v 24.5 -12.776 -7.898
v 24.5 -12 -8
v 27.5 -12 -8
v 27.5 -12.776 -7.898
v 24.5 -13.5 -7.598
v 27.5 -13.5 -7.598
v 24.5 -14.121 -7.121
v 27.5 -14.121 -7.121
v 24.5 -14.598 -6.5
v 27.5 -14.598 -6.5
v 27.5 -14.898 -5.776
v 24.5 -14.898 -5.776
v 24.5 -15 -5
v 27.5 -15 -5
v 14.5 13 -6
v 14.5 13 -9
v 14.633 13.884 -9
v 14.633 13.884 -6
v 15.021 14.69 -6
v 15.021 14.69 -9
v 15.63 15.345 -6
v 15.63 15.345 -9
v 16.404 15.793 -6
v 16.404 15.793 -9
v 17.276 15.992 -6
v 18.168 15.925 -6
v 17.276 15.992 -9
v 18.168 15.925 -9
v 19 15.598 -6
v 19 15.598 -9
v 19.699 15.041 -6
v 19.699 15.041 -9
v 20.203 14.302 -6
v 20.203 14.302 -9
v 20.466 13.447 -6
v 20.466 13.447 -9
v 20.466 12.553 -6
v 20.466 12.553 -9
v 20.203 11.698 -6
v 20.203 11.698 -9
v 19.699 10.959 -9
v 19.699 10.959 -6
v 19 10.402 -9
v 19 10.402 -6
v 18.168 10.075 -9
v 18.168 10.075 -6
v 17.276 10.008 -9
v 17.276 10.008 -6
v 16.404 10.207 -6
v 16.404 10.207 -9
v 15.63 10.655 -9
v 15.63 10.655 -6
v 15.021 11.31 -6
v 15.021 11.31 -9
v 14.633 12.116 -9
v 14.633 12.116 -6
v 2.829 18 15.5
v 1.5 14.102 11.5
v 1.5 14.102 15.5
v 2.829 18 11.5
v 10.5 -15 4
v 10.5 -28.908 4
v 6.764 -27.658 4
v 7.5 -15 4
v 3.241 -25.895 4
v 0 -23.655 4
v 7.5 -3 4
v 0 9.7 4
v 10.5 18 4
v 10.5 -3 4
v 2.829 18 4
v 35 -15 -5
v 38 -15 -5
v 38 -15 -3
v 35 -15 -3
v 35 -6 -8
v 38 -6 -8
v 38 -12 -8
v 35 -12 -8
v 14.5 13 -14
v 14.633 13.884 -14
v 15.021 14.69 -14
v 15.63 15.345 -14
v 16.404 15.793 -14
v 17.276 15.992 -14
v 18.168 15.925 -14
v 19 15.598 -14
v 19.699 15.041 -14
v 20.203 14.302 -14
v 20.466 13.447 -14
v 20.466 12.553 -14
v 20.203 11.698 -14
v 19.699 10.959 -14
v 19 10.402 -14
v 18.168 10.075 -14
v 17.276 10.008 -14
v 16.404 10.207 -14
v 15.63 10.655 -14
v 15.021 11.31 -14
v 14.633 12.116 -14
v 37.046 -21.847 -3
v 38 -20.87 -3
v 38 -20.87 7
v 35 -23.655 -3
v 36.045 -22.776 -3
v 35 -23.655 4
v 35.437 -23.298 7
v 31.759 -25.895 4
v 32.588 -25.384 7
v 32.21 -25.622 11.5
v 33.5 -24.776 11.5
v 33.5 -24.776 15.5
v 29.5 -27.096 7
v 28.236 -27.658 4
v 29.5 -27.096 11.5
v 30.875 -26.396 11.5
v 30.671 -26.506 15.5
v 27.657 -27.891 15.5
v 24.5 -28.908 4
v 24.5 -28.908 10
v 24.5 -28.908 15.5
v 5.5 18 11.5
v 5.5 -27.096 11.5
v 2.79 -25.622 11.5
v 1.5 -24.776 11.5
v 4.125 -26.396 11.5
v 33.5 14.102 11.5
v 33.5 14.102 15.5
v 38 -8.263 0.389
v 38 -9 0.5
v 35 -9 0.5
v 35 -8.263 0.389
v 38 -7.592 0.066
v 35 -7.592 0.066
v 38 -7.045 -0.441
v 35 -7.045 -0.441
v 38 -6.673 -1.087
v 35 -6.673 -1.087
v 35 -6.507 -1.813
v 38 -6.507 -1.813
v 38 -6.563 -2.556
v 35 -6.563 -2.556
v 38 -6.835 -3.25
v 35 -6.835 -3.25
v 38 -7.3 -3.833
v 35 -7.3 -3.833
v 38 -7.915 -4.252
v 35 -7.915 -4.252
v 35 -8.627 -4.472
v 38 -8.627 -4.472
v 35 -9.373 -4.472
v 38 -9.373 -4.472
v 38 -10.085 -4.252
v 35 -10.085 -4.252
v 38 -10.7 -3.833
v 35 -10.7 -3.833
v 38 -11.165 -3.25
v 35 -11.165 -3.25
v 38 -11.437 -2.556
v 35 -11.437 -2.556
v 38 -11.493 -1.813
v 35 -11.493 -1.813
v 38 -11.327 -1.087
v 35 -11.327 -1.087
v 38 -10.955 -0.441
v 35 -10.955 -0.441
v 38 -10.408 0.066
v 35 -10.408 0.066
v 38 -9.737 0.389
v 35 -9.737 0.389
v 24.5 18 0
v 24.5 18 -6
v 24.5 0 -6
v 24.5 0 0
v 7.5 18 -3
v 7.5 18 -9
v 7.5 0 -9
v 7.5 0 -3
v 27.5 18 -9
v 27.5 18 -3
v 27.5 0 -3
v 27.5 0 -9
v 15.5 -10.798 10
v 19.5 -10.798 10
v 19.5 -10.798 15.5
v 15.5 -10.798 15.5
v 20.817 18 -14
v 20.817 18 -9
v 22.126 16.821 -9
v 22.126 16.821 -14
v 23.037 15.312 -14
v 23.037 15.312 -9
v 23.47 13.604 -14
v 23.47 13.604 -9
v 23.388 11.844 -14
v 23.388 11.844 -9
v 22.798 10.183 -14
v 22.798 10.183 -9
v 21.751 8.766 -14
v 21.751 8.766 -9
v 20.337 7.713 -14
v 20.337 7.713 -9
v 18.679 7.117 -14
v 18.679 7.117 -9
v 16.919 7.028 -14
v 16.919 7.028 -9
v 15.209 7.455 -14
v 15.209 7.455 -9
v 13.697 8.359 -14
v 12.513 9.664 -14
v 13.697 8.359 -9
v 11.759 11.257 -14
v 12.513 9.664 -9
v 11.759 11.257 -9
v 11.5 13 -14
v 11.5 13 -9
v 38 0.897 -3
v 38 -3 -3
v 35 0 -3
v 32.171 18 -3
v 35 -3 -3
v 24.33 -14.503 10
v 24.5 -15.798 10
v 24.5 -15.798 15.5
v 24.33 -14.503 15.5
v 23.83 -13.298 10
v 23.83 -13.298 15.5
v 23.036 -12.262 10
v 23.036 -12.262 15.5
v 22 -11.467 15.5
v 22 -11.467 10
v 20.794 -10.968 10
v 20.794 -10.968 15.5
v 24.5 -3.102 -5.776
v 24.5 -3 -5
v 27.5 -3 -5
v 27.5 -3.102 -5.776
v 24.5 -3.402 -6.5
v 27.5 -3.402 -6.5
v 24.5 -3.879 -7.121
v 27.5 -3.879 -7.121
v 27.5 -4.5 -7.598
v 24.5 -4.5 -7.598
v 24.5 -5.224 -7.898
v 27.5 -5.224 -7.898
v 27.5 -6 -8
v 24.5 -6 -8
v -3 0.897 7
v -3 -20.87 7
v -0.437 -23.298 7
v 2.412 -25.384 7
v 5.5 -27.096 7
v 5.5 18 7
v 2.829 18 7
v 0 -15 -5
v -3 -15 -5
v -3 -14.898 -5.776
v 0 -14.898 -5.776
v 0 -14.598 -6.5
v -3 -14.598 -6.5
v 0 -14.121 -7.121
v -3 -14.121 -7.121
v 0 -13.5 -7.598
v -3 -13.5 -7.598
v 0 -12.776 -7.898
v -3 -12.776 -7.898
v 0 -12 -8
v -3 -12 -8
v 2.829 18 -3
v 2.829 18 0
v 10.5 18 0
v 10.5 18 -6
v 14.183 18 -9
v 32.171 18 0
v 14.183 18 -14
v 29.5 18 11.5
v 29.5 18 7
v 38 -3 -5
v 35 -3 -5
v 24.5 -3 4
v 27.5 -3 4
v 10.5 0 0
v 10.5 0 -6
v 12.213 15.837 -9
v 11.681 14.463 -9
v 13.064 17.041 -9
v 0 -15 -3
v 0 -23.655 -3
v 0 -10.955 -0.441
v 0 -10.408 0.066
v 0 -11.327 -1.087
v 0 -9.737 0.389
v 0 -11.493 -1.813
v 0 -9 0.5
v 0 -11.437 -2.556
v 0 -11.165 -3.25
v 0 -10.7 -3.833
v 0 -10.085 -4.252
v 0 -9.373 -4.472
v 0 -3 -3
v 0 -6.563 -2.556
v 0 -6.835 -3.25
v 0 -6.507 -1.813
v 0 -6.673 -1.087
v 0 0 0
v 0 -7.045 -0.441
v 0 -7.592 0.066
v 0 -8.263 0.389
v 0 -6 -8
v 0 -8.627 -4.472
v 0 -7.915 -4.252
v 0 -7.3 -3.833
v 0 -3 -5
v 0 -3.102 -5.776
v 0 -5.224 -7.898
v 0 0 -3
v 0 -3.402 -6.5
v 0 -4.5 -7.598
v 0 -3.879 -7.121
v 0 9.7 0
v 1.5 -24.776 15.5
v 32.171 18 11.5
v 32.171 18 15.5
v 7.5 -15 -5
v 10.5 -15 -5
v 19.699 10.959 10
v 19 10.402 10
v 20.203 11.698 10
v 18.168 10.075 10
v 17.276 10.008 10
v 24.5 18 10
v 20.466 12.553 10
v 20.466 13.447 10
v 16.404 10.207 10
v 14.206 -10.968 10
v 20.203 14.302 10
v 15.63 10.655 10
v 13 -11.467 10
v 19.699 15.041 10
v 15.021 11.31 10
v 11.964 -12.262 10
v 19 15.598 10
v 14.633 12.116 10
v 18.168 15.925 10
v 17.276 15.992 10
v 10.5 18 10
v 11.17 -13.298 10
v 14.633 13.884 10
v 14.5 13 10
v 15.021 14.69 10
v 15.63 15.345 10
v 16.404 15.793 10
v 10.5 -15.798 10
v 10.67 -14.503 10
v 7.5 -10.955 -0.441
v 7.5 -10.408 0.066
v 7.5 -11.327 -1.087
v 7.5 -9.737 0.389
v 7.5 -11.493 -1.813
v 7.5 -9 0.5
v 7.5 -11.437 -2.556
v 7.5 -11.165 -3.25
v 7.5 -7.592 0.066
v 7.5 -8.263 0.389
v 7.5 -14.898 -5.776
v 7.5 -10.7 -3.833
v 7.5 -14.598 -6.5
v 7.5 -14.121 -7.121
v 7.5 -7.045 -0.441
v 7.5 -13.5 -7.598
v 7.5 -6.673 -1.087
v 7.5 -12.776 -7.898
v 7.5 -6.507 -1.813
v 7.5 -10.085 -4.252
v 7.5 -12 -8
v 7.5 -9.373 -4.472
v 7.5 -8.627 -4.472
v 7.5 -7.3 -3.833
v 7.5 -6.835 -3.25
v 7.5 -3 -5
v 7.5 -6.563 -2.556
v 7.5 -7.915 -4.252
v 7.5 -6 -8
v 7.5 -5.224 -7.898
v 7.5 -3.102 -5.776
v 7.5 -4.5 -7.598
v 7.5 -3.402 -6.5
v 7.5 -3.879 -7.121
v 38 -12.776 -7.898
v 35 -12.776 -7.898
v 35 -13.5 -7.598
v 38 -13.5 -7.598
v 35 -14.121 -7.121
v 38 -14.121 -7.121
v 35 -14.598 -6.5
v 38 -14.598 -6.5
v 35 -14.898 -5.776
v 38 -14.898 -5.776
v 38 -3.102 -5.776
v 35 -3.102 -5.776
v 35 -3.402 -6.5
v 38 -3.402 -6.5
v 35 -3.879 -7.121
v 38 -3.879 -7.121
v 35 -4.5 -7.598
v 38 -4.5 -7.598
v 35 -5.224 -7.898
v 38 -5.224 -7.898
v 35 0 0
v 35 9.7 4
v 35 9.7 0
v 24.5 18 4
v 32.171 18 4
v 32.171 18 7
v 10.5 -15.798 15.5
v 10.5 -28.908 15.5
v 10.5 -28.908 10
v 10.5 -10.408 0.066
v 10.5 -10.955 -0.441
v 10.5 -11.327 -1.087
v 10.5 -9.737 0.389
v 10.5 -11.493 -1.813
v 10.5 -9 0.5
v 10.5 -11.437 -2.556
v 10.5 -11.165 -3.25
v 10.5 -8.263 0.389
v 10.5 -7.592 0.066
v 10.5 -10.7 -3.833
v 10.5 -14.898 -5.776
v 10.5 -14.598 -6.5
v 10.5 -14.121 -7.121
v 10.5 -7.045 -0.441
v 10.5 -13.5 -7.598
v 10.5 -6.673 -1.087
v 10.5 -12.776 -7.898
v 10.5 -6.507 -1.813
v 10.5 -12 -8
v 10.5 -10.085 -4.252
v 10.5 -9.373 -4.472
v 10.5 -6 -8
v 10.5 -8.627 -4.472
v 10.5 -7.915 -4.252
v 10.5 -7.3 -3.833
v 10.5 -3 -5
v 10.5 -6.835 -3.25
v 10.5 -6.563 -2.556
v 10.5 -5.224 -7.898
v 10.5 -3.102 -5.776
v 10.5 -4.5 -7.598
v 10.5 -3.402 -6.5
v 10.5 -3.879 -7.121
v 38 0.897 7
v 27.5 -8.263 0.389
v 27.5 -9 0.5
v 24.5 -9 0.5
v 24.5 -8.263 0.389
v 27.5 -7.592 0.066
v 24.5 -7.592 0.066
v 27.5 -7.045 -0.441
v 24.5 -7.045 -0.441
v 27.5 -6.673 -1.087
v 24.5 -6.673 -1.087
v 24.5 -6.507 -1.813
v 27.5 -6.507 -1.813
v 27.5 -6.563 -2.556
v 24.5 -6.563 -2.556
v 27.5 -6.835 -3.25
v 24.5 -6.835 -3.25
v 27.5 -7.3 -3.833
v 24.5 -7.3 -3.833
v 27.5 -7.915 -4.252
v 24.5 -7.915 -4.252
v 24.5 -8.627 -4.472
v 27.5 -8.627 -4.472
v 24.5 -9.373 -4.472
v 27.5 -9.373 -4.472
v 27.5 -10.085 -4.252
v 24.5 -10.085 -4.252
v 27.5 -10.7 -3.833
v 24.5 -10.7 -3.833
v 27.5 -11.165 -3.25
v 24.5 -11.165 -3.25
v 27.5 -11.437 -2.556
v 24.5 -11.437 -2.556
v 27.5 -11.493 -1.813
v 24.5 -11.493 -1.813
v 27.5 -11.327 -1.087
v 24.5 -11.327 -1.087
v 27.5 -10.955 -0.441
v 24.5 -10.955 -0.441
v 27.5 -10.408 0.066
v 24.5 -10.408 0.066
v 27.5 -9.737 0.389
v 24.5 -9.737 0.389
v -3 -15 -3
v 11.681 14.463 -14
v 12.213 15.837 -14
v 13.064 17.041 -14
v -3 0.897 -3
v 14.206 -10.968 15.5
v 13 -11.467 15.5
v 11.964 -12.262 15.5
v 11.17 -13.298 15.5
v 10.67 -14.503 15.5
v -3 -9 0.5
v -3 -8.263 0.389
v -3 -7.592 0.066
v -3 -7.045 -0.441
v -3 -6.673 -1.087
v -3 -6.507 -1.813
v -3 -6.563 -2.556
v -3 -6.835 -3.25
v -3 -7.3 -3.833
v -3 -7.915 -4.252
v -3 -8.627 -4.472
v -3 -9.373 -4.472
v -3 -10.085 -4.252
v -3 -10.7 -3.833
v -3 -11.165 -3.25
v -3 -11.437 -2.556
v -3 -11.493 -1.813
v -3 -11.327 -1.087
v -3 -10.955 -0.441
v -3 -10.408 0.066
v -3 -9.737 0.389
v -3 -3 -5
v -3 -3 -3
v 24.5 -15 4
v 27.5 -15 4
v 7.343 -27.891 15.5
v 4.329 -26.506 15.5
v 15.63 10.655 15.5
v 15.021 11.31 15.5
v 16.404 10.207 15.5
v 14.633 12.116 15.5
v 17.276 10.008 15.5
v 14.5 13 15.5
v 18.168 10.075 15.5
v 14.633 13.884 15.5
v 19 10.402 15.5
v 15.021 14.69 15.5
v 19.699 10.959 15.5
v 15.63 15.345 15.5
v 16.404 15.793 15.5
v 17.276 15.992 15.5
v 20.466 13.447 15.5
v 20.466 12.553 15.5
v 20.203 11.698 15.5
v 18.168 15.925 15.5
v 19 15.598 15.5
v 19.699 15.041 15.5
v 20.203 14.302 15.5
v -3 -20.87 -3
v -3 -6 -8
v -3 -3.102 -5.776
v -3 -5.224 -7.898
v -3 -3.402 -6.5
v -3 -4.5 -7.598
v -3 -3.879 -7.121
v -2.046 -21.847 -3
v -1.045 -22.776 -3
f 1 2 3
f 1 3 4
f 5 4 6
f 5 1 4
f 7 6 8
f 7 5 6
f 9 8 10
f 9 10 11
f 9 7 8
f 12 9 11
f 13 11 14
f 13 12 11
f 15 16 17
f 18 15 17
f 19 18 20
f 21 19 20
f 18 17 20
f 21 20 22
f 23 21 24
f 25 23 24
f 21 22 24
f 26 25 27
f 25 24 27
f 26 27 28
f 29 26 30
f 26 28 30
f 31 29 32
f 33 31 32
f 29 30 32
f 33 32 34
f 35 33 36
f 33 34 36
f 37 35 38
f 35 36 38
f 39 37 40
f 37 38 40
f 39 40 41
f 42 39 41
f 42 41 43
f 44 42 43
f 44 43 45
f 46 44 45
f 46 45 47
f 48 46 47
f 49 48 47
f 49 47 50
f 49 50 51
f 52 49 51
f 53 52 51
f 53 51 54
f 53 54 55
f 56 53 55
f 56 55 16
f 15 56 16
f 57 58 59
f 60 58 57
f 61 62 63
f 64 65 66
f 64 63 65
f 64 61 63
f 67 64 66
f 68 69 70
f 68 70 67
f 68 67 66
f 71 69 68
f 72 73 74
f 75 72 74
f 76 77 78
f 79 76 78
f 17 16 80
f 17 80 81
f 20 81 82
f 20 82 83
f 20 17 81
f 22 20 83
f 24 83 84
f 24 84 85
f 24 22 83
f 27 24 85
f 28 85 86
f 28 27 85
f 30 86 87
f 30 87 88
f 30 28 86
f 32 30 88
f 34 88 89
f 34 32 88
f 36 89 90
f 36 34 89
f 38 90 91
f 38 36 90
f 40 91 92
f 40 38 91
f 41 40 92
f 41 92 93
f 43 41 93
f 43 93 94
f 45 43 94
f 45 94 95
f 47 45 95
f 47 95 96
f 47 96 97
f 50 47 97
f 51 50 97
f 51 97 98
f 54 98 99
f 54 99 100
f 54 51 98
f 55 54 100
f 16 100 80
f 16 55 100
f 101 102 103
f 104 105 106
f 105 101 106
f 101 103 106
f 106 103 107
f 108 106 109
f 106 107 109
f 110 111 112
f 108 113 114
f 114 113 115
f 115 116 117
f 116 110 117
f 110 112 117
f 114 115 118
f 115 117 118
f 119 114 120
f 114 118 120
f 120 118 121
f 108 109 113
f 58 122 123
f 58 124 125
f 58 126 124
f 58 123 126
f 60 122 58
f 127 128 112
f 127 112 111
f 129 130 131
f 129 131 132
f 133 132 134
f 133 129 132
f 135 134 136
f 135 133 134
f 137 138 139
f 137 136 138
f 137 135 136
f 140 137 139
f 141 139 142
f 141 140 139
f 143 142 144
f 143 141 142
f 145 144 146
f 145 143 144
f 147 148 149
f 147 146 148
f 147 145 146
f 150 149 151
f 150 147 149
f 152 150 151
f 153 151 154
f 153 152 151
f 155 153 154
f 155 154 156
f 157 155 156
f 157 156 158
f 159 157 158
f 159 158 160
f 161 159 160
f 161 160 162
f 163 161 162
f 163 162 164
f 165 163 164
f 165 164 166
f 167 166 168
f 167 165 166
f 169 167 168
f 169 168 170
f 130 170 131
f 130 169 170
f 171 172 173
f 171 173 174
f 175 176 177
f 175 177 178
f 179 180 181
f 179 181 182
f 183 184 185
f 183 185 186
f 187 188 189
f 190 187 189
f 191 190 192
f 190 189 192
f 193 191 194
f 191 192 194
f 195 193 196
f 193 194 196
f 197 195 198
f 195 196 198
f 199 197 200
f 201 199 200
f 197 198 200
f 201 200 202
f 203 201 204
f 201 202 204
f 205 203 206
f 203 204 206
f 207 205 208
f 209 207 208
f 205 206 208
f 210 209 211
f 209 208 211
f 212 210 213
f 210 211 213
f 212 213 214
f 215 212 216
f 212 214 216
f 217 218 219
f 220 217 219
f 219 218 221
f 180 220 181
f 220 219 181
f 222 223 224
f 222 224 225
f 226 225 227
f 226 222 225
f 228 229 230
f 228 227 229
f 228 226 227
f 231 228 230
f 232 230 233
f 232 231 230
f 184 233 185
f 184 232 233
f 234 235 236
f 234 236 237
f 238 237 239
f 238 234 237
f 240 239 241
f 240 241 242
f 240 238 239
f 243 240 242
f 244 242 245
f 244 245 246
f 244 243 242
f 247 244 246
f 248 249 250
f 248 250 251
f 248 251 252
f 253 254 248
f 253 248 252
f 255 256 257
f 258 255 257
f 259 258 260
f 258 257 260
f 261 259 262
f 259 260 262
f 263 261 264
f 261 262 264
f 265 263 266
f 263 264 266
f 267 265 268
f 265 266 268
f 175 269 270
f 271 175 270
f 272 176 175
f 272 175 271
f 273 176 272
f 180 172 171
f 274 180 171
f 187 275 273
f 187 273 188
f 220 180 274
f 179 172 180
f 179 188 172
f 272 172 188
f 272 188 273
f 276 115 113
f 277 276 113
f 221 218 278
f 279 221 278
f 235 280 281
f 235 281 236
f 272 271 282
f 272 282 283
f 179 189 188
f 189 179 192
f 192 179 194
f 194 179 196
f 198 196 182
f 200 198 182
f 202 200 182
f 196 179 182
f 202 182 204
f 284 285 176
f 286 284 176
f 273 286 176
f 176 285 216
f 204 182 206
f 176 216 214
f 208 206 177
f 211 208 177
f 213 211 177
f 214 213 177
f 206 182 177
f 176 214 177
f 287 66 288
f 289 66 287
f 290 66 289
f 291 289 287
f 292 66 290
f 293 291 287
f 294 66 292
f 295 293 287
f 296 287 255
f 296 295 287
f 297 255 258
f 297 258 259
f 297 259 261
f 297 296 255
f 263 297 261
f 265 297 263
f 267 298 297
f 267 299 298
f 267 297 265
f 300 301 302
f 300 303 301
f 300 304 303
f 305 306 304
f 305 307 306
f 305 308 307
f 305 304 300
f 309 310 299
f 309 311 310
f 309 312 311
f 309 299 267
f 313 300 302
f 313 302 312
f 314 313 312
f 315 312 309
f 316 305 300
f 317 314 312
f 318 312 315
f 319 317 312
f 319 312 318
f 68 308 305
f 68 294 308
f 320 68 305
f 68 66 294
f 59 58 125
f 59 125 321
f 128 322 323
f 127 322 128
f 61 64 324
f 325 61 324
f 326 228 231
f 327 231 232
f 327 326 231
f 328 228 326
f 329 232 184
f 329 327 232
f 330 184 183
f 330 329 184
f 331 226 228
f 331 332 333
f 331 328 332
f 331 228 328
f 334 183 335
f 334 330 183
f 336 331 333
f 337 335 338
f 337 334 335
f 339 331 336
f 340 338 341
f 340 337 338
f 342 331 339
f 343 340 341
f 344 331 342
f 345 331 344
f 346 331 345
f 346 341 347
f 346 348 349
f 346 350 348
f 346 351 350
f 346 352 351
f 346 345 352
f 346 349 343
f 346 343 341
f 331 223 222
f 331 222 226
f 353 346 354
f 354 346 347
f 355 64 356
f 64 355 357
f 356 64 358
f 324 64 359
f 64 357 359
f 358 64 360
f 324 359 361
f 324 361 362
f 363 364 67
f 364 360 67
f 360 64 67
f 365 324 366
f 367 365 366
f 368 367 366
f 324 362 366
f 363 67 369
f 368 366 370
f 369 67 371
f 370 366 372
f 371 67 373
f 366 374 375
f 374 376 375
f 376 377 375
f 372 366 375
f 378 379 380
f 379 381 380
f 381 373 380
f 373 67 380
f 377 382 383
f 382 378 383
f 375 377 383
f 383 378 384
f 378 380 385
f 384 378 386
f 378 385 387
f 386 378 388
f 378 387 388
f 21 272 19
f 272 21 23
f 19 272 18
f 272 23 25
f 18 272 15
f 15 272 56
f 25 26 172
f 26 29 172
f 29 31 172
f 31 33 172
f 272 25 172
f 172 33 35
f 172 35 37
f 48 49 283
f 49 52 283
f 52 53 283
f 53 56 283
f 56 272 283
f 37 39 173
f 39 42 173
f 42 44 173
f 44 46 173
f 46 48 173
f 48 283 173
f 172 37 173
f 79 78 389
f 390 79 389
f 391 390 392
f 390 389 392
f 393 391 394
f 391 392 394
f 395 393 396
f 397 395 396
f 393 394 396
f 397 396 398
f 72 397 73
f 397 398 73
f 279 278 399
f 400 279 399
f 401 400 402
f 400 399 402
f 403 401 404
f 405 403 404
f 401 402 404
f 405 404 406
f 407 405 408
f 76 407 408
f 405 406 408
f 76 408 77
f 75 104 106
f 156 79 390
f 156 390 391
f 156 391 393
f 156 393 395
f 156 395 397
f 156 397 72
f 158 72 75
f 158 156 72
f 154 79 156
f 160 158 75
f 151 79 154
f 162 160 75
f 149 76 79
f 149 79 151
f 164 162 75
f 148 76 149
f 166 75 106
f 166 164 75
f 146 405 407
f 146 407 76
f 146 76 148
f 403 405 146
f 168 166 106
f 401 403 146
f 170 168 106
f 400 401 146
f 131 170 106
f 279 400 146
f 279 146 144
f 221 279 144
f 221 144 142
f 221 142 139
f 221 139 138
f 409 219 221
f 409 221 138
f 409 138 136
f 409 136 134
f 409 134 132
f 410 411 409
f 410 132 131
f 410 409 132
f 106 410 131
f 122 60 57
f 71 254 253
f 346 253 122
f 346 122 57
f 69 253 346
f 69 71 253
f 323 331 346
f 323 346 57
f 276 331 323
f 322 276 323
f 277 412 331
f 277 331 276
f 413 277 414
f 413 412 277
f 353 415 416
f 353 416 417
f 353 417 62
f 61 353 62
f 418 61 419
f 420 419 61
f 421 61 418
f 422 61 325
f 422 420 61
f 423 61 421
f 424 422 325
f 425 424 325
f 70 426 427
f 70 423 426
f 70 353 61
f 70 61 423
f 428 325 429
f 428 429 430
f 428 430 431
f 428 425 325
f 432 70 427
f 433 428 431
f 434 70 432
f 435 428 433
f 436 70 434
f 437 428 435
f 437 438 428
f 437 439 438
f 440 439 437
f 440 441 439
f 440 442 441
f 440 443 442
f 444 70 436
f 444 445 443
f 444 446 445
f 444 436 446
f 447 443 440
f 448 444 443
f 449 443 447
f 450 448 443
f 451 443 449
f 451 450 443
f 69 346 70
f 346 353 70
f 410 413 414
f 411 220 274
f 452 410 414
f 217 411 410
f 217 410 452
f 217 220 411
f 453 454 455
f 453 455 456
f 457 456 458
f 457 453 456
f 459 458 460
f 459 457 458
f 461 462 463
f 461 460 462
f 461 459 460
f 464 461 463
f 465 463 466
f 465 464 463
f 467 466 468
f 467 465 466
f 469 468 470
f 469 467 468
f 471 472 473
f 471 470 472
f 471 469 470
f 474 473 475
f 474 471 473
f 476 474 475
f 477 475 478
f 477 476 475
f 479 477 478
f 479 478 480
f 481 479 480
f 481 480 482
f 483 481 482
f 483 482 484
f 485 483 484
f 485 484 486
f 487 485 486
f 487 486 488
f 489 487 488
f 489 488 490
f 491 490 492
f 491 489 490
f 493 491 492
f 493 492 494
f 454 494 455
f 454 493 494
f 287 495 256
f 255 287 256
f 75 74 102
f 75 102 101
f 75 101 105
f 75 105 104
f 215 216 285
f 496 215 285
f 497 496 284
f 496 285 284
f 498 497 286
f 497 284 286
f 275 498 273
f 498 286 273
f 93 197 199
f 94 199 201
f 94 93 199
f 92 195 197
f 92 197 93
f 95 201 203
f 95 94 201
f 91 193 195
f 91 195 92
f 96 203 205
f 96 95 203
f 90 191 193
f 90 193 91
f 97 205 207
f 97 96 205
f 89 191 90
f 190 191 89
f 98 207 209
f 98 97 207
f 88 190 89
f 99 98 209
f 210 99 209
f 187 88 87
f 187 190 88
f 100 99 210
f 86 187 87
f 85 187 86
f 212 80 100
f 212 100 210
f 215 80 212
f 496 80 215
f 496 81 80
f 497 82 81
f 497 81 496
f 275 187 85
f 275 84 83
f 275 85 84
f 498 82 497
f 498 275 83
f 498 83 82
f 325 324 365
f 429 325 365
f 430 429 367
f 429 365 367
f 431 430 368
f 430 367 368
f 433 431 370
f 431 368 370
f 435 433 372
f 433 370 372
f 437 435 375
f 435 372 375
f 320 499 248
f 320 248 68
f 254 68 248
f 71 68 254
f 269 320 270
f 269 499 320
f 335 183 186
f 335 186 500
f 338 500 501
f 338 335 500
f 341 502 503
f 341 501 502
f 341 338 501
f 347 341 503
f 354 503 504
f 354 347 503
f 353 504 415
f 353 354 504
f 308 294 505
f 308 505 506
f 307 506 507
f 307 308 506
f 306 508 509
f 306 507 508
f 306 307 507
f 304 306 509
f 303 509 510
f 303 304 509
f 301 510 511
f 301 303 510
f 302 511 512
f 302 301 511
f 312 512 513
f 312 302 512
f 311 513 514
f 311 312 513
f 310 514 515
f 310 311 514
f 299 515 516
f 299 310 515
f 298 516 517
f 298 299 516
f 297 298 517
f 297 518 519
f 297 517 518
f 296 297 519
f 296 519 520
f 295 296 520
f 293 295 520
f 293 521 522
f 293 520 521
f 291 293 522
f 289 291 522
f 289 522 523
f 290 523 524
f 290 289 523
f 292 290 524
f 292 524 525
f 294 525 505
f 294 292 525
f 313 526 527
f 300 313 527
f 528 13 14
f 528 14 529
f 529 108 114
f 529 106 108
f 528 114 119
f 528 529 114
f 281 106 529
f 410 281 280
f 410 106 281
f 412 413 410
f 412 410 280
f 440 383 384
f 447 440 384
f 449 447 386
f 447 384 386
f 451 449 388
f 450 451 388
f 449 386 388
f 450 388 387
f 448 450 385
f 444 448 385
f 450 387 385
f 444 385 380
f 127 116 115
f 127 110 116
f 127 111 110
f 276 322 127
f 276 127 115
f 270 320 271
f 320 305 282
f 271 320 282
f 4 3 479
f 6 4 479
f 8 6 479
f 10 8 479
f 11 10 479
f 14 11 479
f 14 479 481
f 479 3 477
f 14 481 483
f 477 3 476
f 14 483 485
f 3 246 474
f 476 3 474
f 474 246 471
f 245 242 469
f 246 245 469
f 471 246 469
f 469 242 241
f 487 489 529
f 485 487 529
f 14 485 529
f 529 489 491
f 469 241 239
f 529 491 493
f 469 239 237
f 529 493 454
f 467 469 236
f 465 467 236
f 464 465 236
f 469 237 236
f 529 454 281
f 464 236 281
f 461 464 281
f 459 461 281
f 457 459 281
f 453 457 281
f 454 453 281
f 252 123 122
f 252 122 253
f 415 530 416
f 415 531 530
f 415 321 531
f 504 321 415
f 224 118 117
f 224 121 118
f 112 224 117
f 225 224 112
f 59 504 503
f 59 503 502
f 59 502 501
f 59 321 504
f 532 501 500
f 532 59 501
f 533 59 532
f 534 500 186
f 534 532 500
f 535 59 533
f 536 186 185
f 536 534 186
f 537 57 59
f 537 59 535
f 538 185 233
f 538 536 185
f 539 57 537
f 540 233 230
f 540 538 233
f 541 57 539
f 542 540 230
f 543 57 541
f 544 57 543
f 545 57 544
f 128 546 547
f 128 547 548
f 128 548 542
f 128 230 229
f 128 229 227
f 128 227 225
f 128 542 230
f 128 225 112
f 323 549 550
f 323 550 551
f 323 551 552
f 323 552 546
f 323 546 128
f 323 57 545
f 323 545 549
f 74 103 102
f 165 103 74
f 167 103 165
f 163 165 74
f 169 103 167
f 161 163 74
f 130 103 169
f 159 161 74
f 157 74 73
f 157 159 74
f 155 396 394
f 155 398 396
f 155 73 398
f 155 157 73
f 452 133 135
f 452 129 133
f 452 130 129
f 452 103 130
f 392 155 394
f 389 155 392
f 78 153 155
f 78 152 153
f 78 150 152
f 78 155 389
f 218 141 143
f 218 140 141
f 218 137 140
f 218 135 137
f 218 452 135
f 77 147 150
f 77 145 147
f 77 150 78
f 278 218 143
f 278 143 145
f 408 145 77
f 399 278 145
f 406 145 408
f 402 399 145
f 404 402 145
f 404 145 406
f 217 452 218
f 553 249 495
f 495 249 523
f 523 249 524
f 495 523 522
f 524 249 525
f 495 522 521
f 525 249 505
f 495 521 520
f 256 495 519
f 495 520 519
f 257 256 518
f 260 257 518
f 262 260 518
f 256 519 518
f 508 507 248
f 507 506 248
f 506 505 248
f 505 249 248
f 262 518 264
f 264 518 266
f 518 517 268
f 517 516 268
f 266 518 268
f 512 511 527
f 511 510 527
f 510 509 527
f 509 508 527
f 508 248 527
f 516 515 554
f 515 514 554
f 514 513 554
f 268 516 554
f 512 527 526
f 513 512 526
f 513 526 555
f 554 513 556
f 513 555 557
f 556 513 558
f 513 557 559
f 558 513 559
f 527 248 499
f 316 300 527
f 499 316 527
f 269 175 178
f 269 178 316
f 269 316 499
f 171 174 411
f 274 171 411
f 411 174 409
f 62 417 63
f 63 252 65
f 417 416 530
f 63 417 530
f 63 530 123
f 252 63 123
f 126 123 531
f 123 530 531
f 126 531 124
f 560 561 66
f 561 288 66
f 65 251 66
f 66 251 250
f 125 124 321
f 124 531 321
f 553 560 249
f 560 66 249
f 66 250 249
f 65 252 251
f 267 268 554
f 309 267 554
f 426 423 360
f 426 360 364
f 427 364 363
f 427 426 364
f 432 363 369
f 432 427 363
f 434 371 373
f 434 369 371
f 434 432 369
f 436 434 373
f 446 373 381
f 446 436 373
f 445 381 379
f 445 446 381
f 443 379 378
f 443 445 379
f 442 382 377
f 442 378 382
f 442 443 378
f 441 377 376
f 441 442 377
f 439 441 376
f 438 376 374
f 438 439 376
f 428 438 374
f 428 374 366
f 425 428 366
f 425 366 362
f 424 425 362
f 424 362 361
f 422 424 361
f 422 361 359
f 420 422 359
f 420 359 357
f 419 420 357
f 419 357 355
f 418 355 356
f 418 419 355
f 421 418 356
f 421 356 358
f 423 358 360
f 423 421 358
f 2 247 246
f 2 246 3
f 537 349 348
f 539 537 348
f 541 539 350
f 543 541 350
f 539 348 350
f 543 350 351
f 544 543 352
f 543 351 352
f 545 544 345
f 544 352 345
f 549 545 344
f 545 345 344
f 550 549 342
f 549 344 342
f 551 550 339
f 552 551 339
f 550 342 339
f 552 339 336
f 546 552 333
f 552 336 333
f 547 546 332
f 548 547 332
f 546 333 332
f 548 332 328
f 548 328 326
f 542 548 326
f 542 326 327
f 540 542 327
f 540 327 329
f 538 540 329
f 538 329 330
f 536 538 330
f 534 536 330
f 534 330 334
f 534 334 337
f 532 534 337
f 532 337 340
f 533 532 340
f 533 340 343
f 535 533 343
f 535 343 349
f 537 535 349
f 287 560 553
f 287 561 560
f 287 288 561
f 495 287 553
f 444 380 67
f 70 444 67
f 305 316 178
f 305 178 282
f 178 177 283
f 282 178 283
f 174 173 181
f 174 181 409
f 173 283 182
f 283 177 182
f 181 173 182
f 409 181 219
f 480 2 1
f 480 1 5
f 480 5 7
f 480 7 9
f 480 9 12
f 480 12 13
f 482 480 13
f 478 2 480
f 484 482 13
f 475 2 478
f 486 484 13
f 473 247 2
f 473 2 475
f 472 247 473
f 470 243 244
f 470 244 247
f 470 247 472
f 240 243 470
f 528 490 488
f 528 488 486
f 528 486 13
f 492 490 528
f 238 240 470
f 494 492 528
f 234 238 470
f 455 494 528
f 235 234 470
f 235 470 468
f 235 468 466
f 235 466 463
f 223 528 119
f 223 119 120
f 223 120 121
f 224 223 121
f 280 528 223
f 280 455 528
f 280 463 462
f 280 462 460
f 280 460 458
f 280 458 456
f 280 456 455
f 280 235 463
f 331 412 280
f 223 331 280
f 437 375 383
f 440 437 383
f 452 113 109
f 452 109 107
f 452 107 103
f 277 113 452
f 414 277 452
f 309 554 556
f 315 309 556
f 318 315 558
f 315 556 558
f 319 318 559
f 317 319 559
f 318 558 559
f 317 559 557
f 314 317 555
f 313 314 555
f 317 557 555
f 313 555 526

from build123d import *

# Parameters (mm, degrees)
BOSS_EXTRUDE1_DEPTH     = 18
SKETCH2_R               = 3
BOSS_EXTRUDE2_DEPTH     = 5
SKETCH2_3_R             = 3
CUT_EXTRUDE1_DEPTH      = 49.664668909
SKETCH1_3_W             = 2
SKETCH1_3_H             = 4.5
BOSS_EXTRUDE3_DEPTH     = 30
SKETCH3_OUTSIDE_W       = 56.936
SKETCH3_OUTSIDE_H       = 63.936
SKETCH3_OUTSIDE_R       = 28
CUT_EXTRUDE2_DEPTH      = 57.69435598
CUT_EXTRUDE3_START      = -18.5
CUT_EXTRUDE3_DEPTH      = 18.5
CUT_EXTRUDE4_DEPTH      = 57.587476675
CUT_EXTRUDE4_DEPTH_BACK = 10
SKETCH7_R               = 2.5
BOSS_EXTRUDE4_DEPTH     = 3
BOSS_EXTRUDE6_START     = -3
BOSS_EXTRUDE6_DEPTH     = 3
BOSS_EXTRUDE7_START     = -3
BOSS_EXTRUDE7_DEPTH     = 3
BOSS_EXTRUDE8_START     = -3
BOSS_EXTRUDE8_DEPTH     = 3
CUT_EXTRUDE5_DEPTH      = 43.804159814
CUT_EXTRUDE5_DEPTH_BACK = 43.804159814
SKETCH7_3_R             = 2.5


# Read off the part's stored shape, not the designer's step: Cut-Extrude3
with BuildPart() as part:
    # Sketch1 → Boss-Extrude1 (new body)
    with BuildSketch(Plane(origin=(0, 0, 0), x_dir=(1, 0, 0), z_dir=(0, 1, 0))):
        Polygon((7.5, 3), (-3, 3), (-3, -7), (5.5, -7), (5.5, -11.5), (1.5, -11.5), (1.5, -15.5), (33.5, -15.5), (33.5, -11.5), (29.5, -11.5), (29.5, -7), (38, -7), (38, 3), (27.5, 3), (27.5, 9), (7.5, 9), align=None)
        Polygon((24.5, 0), (35, 0), (35, -4), (24.5, -4), (24.5, -10), (10.5, -10), (10.5, -4), (0, -4), (0, 0), (10.5, 0), (10.5, 6), (24.5, 6), align=None, mode=Mode.SUBTRACT)
    extrude(amount=BOSS_EXTRUDE1_DEPTH)

    # Sketch2 → Boss-Extrude2 (add)
    with BuildSketch(Plane(origin=(0, 0, -9), x_dir=(-1, 0, 0), z_dir=(0, 0, -1))):
        with BuildLine():
            ThreePointArc((-20.81662479, 18), (-20.337274331, 7.713235926), (-11.5, 13))
            ThreePointArc((-11.5, 13), (-12.213235926, 15.837274331), (-14.18337521, 18))
            Line((-14.18337521, 18), (-20.81662479, 18))
        make_face()
        with Locations((-17.5, 13)):
            Circle(SKETCH2_R, mode=Mode.SUBTRACT)
    extrude(amount=BOSS_EXTRUDE2_DEPTH)

    # Sketch2<3> → Cut-Extrude1 (cut, through all)
    with BuildSketch(Plane(origin=(0, 0, -9), x_dir=(-1, 0, 0), z_dir=(0, 0, -1))):
        with Locations((-17.5, 13)):
            Circle(SKETCH2_3_R)
    extrude(amount=-CUT_EXTRUDE1_DEPTH, mode=Mode.SUBTRACT)

    # Sketch1<3> → Boss-Extrude3 (add)
    with BuildSketch(Plane(origin=(0, 0, 0), x_dir=(1, 0, 0), z_dir=(0, 1, 0))):
        Polygon((0, -4), (0, 0), (0, 3), (-3, 3), (-3, -7), (5.5, -7), (7.5, -7), (7.5, -11.5), (7.5, -13), (27.5, -13), (27.5, -11.5), (27.5, -7), (29.5, -7), (38, -7), (38, 3), (35, 3), (35, 0), (35, -4), (24.5, -4), (24.5, -10), (10.5, -10), (10.5, -4), align=None)
        with Locations((28.5, -9.25)):
            Rectangle(SKETCH1_3_W, SKETCH1_3_H)
        Polygon((7.5, -11.5), (5.5, -11.5), (1.5, -11.5), (1.5, -15.5), (33.5, -15.5), (33.5, -11.5), (29.5, -11.5), (27.5, -11.5), (27.5, -13), (7.5, -13), align=None)
        with Locations((6.5, -9.25)):
            Rectangle(SKETCH1_3_W, SKETCH1_3_H)
    extrude(amount=-BOSS_EXTRUDE3_DEPTH)

    # Sketch3 outside → Cut-Extrude2 (cut, through all)
    with BuildSketch(Plane.XY.offset(15.5)):
        with Locations((17.5, -6)):
            Rectangle(SKETCH3_OUTSIDE_W, SKETCH3_OUTSIDE_H)
        with Locations((17.5, -1.797525342)):
            Circle(SKETCH3_OUTSIDE_R, mode=Mode.SUBTRACT)
    extrude(amount=-CUT_EXTRUDE2_DEPTH, mode=Mode.SUBTRACT)

    # Cut-Extrude3 outline → Cut-Extrude3 (cut)
    with BuildSketch(Plane.XY.offset(15.5).offset(CUT_EXTRUDE3_START)):
        with BuildLine():
            Line((32.171400751, 18), (38, 0.89725692))
            Line((38, 0.89725692), (38, 17.274705781))
            ThreePointArc((38, 17.274705781), (37.653490195, 17.640500097), (37.300454296, 18))
            Line((37.300454296, 18), (32.171400751, 18))
        make_face()
        with BuildLine():
            Line((2.828599249, 18), (-2.300454296, 18))
            ThreePointArc((-2.300454296, 18), (-2.653490195, 17.640500097), (-3, 17.274705781))
            Line((-3, 17.274705781), (-3, 0.89725692))
            Line((-3, 0.89725692), (2.828599249, 18))
        make_face()
    extrude(amount=CUT_EXTRUDE3_DEPTH, mode=Mode.SUBTRACT)

    # Sketch5 → Cut-Extrude4 (cut, two sides: drawn at the far end of the back side and taken through both)
    with BuildSketch(Plane.XY.offset(15.5).offset(-CUT_EXTRUDE4_DEPTH_BACK)):
        with BuildLine():
            ThreePointArc((10.5, -28.908408765), (17.5, -29.797525342), (24.5, -28.908408765))
            Line((24.5, -28.908408765), (24.5, -15.797525342))
            ThreePointArc((24.5, -15.797525342), (23.035533906, -12.261991436), (19.5, -10.797525342))
            Line((19.5, -10.797525342), (15.5, -10.797525342))
            ThreePointArc((15.5, -10.797525342), (11.964466094, -12.261991436), (10.5, -15.797525342))
            Line((10.5, -15.797525342), (10.5, -28.908408765))
        make_face()
    extrude(amount=CUT_EXTRUDE4_DEPTH + CUT_EXTRUDE4_DEPTH_BACK, mode=Mode.SUBTRACT)

    # Sketch7 → Boss-Extrude4 (add)
    # profile 1 of 2: a face of its own
    with BuildSketch(Plane.ZY.offset(-24.5)):
        with BuildLine():
            Line((-5, -15), (4, -15))
            Line((4, -15), (4, -3))
            Line((4, -3), (-5, -3))
            ThreePointArc((-5, -3), (-7.121320344, -3.878679656), (-8, -6))
            Line((-8, -6), (-8, -12))
            ThreePointArc((-8, -12), (-7.121320344, -14.121320344), (-5, -15))
        make_face()
        with Locations((-2, -9)):
            Circle(SKETCH7_R, mode=Mode.SUBTRACT)
    # profile 2 of 2: a face of its own
    with BuildSketch(Plane.ZY.offset(-24.5)):
        with Locations((-2, -9)):
            Circle(SKETCH7_R)
    extrude(amount=-BOSS_EXTRUDE4_DEPTH)

    # Sketch9 → Boss-Extrude6 (add)
    with BuildSketch(Plane(origin=(10.5, 0, 0), x_dir=(0, 0, -1), z_dir=(1, 0, 0)).offset(BOSS_EXTRUDE6_START)):
        with BuildLine():
            Line((-4, -15), (5, -15))
            ThreePointArc((5, -15), (7.121320344, -14.121320344), (8, -12))
            Line((8, -12), (8, -6))
            ThreePointArc((8, -6), (7.121320344, -3.878679656), (5, -3))
            Line((5, -3), (-4, -3))
            Line((-4, -3), (-4, -15))
        make_face()
    extrude(amount=BOSS_EXTRUDE6_DEPTH)

    # Sketch10 → Boss-Extrude7 (add)
    with BuildSketch(Plane.ZY.offset(-35).offset(BOSS_EXTRUDE7_START)):
        with BuildLine():
            Line((-5, -15), (-3, -15))
            Line((-3, -15), (-3, -3))
            Line((-3, -3), (-5, -3))
            ThreePointArc((-5, -3), (-7.121320344, -3.878679656), (-8, -6))
            Line((-8, -6), (-8, -12))
            ThreePointArc((-8, -12), (-7.121320344, -14.121320344), (-5, -15))
        make_face()
    extrude(amount=BOSS_EXTRUDE7_DEPTH)

    # Sketch11 → Boss-Extrude8 (add)
    with BuildSketch(Plane(origin=(0, 0, 0), x_dir=(0, 0, -1), z_dir=(1, 0, 0)).offset(BOSS_EXTRUDE8_START)):
        with BuildLine():
            Line((5, -3), (3, -3))
            Line((3, -3), (3, -6.708712153))
            ThreePointArc((3, -6.708712153), (4.091650066, -7.630693606), (4.5, -9))
            ThreePointArc((4.5, -9), (4.091650066, -10.369306394), (3, -11.291287847))
            Line((3, -11.291287847), (3, -15))
            Line((3, -15), (5, -15))
            ThreePointArc((5, -15), (7.121320344, -14.121320344), (8, -12))
            Line((8, -12), (8, -6))
            ThreePointArc((8, -6), (7.121320344, -3.878679656), (5, -3))
        make_face()
        with BuildLine():
            ThreePointArc((4.5, -9), (4.091650066, -7.630693606), (3, -6.708712153))
            Line((3, -6.708712153), (3, -11.291287847))
            ThreePointArc((3, -11.291287847), (4.091650066, -10.369306394), (4.5, -9))
        make_face()
        with BuildLine():
            Line((3, -11.291287847), (3, -6.708712153))
            ThreePointArc((3, -6.708712153), (-0.5, -9), (3, -11.291287847))
        make_face()
    extrude(amount=BOSS_EXTRUDE8_DEPTH)

    # Sketch7<3> → Cut-Extrude5 (cut, two sides: drawn at the far end of the back side and taken through both)
    with BuildSketch(Plane.ZY.offset(-24.5).offset(-CUT_EXTRUDE5_DEPTH_BACK)):
        with Locations((-2, -9)):
            Circle(SKETCH7_3_R)
    extrude(amount=CUT_EXTRUDE5_DEPTH + CUT_EXTRUDE5_DEPTH_BACK, mode=Mode.SUBTRACT)


solid = part.part
